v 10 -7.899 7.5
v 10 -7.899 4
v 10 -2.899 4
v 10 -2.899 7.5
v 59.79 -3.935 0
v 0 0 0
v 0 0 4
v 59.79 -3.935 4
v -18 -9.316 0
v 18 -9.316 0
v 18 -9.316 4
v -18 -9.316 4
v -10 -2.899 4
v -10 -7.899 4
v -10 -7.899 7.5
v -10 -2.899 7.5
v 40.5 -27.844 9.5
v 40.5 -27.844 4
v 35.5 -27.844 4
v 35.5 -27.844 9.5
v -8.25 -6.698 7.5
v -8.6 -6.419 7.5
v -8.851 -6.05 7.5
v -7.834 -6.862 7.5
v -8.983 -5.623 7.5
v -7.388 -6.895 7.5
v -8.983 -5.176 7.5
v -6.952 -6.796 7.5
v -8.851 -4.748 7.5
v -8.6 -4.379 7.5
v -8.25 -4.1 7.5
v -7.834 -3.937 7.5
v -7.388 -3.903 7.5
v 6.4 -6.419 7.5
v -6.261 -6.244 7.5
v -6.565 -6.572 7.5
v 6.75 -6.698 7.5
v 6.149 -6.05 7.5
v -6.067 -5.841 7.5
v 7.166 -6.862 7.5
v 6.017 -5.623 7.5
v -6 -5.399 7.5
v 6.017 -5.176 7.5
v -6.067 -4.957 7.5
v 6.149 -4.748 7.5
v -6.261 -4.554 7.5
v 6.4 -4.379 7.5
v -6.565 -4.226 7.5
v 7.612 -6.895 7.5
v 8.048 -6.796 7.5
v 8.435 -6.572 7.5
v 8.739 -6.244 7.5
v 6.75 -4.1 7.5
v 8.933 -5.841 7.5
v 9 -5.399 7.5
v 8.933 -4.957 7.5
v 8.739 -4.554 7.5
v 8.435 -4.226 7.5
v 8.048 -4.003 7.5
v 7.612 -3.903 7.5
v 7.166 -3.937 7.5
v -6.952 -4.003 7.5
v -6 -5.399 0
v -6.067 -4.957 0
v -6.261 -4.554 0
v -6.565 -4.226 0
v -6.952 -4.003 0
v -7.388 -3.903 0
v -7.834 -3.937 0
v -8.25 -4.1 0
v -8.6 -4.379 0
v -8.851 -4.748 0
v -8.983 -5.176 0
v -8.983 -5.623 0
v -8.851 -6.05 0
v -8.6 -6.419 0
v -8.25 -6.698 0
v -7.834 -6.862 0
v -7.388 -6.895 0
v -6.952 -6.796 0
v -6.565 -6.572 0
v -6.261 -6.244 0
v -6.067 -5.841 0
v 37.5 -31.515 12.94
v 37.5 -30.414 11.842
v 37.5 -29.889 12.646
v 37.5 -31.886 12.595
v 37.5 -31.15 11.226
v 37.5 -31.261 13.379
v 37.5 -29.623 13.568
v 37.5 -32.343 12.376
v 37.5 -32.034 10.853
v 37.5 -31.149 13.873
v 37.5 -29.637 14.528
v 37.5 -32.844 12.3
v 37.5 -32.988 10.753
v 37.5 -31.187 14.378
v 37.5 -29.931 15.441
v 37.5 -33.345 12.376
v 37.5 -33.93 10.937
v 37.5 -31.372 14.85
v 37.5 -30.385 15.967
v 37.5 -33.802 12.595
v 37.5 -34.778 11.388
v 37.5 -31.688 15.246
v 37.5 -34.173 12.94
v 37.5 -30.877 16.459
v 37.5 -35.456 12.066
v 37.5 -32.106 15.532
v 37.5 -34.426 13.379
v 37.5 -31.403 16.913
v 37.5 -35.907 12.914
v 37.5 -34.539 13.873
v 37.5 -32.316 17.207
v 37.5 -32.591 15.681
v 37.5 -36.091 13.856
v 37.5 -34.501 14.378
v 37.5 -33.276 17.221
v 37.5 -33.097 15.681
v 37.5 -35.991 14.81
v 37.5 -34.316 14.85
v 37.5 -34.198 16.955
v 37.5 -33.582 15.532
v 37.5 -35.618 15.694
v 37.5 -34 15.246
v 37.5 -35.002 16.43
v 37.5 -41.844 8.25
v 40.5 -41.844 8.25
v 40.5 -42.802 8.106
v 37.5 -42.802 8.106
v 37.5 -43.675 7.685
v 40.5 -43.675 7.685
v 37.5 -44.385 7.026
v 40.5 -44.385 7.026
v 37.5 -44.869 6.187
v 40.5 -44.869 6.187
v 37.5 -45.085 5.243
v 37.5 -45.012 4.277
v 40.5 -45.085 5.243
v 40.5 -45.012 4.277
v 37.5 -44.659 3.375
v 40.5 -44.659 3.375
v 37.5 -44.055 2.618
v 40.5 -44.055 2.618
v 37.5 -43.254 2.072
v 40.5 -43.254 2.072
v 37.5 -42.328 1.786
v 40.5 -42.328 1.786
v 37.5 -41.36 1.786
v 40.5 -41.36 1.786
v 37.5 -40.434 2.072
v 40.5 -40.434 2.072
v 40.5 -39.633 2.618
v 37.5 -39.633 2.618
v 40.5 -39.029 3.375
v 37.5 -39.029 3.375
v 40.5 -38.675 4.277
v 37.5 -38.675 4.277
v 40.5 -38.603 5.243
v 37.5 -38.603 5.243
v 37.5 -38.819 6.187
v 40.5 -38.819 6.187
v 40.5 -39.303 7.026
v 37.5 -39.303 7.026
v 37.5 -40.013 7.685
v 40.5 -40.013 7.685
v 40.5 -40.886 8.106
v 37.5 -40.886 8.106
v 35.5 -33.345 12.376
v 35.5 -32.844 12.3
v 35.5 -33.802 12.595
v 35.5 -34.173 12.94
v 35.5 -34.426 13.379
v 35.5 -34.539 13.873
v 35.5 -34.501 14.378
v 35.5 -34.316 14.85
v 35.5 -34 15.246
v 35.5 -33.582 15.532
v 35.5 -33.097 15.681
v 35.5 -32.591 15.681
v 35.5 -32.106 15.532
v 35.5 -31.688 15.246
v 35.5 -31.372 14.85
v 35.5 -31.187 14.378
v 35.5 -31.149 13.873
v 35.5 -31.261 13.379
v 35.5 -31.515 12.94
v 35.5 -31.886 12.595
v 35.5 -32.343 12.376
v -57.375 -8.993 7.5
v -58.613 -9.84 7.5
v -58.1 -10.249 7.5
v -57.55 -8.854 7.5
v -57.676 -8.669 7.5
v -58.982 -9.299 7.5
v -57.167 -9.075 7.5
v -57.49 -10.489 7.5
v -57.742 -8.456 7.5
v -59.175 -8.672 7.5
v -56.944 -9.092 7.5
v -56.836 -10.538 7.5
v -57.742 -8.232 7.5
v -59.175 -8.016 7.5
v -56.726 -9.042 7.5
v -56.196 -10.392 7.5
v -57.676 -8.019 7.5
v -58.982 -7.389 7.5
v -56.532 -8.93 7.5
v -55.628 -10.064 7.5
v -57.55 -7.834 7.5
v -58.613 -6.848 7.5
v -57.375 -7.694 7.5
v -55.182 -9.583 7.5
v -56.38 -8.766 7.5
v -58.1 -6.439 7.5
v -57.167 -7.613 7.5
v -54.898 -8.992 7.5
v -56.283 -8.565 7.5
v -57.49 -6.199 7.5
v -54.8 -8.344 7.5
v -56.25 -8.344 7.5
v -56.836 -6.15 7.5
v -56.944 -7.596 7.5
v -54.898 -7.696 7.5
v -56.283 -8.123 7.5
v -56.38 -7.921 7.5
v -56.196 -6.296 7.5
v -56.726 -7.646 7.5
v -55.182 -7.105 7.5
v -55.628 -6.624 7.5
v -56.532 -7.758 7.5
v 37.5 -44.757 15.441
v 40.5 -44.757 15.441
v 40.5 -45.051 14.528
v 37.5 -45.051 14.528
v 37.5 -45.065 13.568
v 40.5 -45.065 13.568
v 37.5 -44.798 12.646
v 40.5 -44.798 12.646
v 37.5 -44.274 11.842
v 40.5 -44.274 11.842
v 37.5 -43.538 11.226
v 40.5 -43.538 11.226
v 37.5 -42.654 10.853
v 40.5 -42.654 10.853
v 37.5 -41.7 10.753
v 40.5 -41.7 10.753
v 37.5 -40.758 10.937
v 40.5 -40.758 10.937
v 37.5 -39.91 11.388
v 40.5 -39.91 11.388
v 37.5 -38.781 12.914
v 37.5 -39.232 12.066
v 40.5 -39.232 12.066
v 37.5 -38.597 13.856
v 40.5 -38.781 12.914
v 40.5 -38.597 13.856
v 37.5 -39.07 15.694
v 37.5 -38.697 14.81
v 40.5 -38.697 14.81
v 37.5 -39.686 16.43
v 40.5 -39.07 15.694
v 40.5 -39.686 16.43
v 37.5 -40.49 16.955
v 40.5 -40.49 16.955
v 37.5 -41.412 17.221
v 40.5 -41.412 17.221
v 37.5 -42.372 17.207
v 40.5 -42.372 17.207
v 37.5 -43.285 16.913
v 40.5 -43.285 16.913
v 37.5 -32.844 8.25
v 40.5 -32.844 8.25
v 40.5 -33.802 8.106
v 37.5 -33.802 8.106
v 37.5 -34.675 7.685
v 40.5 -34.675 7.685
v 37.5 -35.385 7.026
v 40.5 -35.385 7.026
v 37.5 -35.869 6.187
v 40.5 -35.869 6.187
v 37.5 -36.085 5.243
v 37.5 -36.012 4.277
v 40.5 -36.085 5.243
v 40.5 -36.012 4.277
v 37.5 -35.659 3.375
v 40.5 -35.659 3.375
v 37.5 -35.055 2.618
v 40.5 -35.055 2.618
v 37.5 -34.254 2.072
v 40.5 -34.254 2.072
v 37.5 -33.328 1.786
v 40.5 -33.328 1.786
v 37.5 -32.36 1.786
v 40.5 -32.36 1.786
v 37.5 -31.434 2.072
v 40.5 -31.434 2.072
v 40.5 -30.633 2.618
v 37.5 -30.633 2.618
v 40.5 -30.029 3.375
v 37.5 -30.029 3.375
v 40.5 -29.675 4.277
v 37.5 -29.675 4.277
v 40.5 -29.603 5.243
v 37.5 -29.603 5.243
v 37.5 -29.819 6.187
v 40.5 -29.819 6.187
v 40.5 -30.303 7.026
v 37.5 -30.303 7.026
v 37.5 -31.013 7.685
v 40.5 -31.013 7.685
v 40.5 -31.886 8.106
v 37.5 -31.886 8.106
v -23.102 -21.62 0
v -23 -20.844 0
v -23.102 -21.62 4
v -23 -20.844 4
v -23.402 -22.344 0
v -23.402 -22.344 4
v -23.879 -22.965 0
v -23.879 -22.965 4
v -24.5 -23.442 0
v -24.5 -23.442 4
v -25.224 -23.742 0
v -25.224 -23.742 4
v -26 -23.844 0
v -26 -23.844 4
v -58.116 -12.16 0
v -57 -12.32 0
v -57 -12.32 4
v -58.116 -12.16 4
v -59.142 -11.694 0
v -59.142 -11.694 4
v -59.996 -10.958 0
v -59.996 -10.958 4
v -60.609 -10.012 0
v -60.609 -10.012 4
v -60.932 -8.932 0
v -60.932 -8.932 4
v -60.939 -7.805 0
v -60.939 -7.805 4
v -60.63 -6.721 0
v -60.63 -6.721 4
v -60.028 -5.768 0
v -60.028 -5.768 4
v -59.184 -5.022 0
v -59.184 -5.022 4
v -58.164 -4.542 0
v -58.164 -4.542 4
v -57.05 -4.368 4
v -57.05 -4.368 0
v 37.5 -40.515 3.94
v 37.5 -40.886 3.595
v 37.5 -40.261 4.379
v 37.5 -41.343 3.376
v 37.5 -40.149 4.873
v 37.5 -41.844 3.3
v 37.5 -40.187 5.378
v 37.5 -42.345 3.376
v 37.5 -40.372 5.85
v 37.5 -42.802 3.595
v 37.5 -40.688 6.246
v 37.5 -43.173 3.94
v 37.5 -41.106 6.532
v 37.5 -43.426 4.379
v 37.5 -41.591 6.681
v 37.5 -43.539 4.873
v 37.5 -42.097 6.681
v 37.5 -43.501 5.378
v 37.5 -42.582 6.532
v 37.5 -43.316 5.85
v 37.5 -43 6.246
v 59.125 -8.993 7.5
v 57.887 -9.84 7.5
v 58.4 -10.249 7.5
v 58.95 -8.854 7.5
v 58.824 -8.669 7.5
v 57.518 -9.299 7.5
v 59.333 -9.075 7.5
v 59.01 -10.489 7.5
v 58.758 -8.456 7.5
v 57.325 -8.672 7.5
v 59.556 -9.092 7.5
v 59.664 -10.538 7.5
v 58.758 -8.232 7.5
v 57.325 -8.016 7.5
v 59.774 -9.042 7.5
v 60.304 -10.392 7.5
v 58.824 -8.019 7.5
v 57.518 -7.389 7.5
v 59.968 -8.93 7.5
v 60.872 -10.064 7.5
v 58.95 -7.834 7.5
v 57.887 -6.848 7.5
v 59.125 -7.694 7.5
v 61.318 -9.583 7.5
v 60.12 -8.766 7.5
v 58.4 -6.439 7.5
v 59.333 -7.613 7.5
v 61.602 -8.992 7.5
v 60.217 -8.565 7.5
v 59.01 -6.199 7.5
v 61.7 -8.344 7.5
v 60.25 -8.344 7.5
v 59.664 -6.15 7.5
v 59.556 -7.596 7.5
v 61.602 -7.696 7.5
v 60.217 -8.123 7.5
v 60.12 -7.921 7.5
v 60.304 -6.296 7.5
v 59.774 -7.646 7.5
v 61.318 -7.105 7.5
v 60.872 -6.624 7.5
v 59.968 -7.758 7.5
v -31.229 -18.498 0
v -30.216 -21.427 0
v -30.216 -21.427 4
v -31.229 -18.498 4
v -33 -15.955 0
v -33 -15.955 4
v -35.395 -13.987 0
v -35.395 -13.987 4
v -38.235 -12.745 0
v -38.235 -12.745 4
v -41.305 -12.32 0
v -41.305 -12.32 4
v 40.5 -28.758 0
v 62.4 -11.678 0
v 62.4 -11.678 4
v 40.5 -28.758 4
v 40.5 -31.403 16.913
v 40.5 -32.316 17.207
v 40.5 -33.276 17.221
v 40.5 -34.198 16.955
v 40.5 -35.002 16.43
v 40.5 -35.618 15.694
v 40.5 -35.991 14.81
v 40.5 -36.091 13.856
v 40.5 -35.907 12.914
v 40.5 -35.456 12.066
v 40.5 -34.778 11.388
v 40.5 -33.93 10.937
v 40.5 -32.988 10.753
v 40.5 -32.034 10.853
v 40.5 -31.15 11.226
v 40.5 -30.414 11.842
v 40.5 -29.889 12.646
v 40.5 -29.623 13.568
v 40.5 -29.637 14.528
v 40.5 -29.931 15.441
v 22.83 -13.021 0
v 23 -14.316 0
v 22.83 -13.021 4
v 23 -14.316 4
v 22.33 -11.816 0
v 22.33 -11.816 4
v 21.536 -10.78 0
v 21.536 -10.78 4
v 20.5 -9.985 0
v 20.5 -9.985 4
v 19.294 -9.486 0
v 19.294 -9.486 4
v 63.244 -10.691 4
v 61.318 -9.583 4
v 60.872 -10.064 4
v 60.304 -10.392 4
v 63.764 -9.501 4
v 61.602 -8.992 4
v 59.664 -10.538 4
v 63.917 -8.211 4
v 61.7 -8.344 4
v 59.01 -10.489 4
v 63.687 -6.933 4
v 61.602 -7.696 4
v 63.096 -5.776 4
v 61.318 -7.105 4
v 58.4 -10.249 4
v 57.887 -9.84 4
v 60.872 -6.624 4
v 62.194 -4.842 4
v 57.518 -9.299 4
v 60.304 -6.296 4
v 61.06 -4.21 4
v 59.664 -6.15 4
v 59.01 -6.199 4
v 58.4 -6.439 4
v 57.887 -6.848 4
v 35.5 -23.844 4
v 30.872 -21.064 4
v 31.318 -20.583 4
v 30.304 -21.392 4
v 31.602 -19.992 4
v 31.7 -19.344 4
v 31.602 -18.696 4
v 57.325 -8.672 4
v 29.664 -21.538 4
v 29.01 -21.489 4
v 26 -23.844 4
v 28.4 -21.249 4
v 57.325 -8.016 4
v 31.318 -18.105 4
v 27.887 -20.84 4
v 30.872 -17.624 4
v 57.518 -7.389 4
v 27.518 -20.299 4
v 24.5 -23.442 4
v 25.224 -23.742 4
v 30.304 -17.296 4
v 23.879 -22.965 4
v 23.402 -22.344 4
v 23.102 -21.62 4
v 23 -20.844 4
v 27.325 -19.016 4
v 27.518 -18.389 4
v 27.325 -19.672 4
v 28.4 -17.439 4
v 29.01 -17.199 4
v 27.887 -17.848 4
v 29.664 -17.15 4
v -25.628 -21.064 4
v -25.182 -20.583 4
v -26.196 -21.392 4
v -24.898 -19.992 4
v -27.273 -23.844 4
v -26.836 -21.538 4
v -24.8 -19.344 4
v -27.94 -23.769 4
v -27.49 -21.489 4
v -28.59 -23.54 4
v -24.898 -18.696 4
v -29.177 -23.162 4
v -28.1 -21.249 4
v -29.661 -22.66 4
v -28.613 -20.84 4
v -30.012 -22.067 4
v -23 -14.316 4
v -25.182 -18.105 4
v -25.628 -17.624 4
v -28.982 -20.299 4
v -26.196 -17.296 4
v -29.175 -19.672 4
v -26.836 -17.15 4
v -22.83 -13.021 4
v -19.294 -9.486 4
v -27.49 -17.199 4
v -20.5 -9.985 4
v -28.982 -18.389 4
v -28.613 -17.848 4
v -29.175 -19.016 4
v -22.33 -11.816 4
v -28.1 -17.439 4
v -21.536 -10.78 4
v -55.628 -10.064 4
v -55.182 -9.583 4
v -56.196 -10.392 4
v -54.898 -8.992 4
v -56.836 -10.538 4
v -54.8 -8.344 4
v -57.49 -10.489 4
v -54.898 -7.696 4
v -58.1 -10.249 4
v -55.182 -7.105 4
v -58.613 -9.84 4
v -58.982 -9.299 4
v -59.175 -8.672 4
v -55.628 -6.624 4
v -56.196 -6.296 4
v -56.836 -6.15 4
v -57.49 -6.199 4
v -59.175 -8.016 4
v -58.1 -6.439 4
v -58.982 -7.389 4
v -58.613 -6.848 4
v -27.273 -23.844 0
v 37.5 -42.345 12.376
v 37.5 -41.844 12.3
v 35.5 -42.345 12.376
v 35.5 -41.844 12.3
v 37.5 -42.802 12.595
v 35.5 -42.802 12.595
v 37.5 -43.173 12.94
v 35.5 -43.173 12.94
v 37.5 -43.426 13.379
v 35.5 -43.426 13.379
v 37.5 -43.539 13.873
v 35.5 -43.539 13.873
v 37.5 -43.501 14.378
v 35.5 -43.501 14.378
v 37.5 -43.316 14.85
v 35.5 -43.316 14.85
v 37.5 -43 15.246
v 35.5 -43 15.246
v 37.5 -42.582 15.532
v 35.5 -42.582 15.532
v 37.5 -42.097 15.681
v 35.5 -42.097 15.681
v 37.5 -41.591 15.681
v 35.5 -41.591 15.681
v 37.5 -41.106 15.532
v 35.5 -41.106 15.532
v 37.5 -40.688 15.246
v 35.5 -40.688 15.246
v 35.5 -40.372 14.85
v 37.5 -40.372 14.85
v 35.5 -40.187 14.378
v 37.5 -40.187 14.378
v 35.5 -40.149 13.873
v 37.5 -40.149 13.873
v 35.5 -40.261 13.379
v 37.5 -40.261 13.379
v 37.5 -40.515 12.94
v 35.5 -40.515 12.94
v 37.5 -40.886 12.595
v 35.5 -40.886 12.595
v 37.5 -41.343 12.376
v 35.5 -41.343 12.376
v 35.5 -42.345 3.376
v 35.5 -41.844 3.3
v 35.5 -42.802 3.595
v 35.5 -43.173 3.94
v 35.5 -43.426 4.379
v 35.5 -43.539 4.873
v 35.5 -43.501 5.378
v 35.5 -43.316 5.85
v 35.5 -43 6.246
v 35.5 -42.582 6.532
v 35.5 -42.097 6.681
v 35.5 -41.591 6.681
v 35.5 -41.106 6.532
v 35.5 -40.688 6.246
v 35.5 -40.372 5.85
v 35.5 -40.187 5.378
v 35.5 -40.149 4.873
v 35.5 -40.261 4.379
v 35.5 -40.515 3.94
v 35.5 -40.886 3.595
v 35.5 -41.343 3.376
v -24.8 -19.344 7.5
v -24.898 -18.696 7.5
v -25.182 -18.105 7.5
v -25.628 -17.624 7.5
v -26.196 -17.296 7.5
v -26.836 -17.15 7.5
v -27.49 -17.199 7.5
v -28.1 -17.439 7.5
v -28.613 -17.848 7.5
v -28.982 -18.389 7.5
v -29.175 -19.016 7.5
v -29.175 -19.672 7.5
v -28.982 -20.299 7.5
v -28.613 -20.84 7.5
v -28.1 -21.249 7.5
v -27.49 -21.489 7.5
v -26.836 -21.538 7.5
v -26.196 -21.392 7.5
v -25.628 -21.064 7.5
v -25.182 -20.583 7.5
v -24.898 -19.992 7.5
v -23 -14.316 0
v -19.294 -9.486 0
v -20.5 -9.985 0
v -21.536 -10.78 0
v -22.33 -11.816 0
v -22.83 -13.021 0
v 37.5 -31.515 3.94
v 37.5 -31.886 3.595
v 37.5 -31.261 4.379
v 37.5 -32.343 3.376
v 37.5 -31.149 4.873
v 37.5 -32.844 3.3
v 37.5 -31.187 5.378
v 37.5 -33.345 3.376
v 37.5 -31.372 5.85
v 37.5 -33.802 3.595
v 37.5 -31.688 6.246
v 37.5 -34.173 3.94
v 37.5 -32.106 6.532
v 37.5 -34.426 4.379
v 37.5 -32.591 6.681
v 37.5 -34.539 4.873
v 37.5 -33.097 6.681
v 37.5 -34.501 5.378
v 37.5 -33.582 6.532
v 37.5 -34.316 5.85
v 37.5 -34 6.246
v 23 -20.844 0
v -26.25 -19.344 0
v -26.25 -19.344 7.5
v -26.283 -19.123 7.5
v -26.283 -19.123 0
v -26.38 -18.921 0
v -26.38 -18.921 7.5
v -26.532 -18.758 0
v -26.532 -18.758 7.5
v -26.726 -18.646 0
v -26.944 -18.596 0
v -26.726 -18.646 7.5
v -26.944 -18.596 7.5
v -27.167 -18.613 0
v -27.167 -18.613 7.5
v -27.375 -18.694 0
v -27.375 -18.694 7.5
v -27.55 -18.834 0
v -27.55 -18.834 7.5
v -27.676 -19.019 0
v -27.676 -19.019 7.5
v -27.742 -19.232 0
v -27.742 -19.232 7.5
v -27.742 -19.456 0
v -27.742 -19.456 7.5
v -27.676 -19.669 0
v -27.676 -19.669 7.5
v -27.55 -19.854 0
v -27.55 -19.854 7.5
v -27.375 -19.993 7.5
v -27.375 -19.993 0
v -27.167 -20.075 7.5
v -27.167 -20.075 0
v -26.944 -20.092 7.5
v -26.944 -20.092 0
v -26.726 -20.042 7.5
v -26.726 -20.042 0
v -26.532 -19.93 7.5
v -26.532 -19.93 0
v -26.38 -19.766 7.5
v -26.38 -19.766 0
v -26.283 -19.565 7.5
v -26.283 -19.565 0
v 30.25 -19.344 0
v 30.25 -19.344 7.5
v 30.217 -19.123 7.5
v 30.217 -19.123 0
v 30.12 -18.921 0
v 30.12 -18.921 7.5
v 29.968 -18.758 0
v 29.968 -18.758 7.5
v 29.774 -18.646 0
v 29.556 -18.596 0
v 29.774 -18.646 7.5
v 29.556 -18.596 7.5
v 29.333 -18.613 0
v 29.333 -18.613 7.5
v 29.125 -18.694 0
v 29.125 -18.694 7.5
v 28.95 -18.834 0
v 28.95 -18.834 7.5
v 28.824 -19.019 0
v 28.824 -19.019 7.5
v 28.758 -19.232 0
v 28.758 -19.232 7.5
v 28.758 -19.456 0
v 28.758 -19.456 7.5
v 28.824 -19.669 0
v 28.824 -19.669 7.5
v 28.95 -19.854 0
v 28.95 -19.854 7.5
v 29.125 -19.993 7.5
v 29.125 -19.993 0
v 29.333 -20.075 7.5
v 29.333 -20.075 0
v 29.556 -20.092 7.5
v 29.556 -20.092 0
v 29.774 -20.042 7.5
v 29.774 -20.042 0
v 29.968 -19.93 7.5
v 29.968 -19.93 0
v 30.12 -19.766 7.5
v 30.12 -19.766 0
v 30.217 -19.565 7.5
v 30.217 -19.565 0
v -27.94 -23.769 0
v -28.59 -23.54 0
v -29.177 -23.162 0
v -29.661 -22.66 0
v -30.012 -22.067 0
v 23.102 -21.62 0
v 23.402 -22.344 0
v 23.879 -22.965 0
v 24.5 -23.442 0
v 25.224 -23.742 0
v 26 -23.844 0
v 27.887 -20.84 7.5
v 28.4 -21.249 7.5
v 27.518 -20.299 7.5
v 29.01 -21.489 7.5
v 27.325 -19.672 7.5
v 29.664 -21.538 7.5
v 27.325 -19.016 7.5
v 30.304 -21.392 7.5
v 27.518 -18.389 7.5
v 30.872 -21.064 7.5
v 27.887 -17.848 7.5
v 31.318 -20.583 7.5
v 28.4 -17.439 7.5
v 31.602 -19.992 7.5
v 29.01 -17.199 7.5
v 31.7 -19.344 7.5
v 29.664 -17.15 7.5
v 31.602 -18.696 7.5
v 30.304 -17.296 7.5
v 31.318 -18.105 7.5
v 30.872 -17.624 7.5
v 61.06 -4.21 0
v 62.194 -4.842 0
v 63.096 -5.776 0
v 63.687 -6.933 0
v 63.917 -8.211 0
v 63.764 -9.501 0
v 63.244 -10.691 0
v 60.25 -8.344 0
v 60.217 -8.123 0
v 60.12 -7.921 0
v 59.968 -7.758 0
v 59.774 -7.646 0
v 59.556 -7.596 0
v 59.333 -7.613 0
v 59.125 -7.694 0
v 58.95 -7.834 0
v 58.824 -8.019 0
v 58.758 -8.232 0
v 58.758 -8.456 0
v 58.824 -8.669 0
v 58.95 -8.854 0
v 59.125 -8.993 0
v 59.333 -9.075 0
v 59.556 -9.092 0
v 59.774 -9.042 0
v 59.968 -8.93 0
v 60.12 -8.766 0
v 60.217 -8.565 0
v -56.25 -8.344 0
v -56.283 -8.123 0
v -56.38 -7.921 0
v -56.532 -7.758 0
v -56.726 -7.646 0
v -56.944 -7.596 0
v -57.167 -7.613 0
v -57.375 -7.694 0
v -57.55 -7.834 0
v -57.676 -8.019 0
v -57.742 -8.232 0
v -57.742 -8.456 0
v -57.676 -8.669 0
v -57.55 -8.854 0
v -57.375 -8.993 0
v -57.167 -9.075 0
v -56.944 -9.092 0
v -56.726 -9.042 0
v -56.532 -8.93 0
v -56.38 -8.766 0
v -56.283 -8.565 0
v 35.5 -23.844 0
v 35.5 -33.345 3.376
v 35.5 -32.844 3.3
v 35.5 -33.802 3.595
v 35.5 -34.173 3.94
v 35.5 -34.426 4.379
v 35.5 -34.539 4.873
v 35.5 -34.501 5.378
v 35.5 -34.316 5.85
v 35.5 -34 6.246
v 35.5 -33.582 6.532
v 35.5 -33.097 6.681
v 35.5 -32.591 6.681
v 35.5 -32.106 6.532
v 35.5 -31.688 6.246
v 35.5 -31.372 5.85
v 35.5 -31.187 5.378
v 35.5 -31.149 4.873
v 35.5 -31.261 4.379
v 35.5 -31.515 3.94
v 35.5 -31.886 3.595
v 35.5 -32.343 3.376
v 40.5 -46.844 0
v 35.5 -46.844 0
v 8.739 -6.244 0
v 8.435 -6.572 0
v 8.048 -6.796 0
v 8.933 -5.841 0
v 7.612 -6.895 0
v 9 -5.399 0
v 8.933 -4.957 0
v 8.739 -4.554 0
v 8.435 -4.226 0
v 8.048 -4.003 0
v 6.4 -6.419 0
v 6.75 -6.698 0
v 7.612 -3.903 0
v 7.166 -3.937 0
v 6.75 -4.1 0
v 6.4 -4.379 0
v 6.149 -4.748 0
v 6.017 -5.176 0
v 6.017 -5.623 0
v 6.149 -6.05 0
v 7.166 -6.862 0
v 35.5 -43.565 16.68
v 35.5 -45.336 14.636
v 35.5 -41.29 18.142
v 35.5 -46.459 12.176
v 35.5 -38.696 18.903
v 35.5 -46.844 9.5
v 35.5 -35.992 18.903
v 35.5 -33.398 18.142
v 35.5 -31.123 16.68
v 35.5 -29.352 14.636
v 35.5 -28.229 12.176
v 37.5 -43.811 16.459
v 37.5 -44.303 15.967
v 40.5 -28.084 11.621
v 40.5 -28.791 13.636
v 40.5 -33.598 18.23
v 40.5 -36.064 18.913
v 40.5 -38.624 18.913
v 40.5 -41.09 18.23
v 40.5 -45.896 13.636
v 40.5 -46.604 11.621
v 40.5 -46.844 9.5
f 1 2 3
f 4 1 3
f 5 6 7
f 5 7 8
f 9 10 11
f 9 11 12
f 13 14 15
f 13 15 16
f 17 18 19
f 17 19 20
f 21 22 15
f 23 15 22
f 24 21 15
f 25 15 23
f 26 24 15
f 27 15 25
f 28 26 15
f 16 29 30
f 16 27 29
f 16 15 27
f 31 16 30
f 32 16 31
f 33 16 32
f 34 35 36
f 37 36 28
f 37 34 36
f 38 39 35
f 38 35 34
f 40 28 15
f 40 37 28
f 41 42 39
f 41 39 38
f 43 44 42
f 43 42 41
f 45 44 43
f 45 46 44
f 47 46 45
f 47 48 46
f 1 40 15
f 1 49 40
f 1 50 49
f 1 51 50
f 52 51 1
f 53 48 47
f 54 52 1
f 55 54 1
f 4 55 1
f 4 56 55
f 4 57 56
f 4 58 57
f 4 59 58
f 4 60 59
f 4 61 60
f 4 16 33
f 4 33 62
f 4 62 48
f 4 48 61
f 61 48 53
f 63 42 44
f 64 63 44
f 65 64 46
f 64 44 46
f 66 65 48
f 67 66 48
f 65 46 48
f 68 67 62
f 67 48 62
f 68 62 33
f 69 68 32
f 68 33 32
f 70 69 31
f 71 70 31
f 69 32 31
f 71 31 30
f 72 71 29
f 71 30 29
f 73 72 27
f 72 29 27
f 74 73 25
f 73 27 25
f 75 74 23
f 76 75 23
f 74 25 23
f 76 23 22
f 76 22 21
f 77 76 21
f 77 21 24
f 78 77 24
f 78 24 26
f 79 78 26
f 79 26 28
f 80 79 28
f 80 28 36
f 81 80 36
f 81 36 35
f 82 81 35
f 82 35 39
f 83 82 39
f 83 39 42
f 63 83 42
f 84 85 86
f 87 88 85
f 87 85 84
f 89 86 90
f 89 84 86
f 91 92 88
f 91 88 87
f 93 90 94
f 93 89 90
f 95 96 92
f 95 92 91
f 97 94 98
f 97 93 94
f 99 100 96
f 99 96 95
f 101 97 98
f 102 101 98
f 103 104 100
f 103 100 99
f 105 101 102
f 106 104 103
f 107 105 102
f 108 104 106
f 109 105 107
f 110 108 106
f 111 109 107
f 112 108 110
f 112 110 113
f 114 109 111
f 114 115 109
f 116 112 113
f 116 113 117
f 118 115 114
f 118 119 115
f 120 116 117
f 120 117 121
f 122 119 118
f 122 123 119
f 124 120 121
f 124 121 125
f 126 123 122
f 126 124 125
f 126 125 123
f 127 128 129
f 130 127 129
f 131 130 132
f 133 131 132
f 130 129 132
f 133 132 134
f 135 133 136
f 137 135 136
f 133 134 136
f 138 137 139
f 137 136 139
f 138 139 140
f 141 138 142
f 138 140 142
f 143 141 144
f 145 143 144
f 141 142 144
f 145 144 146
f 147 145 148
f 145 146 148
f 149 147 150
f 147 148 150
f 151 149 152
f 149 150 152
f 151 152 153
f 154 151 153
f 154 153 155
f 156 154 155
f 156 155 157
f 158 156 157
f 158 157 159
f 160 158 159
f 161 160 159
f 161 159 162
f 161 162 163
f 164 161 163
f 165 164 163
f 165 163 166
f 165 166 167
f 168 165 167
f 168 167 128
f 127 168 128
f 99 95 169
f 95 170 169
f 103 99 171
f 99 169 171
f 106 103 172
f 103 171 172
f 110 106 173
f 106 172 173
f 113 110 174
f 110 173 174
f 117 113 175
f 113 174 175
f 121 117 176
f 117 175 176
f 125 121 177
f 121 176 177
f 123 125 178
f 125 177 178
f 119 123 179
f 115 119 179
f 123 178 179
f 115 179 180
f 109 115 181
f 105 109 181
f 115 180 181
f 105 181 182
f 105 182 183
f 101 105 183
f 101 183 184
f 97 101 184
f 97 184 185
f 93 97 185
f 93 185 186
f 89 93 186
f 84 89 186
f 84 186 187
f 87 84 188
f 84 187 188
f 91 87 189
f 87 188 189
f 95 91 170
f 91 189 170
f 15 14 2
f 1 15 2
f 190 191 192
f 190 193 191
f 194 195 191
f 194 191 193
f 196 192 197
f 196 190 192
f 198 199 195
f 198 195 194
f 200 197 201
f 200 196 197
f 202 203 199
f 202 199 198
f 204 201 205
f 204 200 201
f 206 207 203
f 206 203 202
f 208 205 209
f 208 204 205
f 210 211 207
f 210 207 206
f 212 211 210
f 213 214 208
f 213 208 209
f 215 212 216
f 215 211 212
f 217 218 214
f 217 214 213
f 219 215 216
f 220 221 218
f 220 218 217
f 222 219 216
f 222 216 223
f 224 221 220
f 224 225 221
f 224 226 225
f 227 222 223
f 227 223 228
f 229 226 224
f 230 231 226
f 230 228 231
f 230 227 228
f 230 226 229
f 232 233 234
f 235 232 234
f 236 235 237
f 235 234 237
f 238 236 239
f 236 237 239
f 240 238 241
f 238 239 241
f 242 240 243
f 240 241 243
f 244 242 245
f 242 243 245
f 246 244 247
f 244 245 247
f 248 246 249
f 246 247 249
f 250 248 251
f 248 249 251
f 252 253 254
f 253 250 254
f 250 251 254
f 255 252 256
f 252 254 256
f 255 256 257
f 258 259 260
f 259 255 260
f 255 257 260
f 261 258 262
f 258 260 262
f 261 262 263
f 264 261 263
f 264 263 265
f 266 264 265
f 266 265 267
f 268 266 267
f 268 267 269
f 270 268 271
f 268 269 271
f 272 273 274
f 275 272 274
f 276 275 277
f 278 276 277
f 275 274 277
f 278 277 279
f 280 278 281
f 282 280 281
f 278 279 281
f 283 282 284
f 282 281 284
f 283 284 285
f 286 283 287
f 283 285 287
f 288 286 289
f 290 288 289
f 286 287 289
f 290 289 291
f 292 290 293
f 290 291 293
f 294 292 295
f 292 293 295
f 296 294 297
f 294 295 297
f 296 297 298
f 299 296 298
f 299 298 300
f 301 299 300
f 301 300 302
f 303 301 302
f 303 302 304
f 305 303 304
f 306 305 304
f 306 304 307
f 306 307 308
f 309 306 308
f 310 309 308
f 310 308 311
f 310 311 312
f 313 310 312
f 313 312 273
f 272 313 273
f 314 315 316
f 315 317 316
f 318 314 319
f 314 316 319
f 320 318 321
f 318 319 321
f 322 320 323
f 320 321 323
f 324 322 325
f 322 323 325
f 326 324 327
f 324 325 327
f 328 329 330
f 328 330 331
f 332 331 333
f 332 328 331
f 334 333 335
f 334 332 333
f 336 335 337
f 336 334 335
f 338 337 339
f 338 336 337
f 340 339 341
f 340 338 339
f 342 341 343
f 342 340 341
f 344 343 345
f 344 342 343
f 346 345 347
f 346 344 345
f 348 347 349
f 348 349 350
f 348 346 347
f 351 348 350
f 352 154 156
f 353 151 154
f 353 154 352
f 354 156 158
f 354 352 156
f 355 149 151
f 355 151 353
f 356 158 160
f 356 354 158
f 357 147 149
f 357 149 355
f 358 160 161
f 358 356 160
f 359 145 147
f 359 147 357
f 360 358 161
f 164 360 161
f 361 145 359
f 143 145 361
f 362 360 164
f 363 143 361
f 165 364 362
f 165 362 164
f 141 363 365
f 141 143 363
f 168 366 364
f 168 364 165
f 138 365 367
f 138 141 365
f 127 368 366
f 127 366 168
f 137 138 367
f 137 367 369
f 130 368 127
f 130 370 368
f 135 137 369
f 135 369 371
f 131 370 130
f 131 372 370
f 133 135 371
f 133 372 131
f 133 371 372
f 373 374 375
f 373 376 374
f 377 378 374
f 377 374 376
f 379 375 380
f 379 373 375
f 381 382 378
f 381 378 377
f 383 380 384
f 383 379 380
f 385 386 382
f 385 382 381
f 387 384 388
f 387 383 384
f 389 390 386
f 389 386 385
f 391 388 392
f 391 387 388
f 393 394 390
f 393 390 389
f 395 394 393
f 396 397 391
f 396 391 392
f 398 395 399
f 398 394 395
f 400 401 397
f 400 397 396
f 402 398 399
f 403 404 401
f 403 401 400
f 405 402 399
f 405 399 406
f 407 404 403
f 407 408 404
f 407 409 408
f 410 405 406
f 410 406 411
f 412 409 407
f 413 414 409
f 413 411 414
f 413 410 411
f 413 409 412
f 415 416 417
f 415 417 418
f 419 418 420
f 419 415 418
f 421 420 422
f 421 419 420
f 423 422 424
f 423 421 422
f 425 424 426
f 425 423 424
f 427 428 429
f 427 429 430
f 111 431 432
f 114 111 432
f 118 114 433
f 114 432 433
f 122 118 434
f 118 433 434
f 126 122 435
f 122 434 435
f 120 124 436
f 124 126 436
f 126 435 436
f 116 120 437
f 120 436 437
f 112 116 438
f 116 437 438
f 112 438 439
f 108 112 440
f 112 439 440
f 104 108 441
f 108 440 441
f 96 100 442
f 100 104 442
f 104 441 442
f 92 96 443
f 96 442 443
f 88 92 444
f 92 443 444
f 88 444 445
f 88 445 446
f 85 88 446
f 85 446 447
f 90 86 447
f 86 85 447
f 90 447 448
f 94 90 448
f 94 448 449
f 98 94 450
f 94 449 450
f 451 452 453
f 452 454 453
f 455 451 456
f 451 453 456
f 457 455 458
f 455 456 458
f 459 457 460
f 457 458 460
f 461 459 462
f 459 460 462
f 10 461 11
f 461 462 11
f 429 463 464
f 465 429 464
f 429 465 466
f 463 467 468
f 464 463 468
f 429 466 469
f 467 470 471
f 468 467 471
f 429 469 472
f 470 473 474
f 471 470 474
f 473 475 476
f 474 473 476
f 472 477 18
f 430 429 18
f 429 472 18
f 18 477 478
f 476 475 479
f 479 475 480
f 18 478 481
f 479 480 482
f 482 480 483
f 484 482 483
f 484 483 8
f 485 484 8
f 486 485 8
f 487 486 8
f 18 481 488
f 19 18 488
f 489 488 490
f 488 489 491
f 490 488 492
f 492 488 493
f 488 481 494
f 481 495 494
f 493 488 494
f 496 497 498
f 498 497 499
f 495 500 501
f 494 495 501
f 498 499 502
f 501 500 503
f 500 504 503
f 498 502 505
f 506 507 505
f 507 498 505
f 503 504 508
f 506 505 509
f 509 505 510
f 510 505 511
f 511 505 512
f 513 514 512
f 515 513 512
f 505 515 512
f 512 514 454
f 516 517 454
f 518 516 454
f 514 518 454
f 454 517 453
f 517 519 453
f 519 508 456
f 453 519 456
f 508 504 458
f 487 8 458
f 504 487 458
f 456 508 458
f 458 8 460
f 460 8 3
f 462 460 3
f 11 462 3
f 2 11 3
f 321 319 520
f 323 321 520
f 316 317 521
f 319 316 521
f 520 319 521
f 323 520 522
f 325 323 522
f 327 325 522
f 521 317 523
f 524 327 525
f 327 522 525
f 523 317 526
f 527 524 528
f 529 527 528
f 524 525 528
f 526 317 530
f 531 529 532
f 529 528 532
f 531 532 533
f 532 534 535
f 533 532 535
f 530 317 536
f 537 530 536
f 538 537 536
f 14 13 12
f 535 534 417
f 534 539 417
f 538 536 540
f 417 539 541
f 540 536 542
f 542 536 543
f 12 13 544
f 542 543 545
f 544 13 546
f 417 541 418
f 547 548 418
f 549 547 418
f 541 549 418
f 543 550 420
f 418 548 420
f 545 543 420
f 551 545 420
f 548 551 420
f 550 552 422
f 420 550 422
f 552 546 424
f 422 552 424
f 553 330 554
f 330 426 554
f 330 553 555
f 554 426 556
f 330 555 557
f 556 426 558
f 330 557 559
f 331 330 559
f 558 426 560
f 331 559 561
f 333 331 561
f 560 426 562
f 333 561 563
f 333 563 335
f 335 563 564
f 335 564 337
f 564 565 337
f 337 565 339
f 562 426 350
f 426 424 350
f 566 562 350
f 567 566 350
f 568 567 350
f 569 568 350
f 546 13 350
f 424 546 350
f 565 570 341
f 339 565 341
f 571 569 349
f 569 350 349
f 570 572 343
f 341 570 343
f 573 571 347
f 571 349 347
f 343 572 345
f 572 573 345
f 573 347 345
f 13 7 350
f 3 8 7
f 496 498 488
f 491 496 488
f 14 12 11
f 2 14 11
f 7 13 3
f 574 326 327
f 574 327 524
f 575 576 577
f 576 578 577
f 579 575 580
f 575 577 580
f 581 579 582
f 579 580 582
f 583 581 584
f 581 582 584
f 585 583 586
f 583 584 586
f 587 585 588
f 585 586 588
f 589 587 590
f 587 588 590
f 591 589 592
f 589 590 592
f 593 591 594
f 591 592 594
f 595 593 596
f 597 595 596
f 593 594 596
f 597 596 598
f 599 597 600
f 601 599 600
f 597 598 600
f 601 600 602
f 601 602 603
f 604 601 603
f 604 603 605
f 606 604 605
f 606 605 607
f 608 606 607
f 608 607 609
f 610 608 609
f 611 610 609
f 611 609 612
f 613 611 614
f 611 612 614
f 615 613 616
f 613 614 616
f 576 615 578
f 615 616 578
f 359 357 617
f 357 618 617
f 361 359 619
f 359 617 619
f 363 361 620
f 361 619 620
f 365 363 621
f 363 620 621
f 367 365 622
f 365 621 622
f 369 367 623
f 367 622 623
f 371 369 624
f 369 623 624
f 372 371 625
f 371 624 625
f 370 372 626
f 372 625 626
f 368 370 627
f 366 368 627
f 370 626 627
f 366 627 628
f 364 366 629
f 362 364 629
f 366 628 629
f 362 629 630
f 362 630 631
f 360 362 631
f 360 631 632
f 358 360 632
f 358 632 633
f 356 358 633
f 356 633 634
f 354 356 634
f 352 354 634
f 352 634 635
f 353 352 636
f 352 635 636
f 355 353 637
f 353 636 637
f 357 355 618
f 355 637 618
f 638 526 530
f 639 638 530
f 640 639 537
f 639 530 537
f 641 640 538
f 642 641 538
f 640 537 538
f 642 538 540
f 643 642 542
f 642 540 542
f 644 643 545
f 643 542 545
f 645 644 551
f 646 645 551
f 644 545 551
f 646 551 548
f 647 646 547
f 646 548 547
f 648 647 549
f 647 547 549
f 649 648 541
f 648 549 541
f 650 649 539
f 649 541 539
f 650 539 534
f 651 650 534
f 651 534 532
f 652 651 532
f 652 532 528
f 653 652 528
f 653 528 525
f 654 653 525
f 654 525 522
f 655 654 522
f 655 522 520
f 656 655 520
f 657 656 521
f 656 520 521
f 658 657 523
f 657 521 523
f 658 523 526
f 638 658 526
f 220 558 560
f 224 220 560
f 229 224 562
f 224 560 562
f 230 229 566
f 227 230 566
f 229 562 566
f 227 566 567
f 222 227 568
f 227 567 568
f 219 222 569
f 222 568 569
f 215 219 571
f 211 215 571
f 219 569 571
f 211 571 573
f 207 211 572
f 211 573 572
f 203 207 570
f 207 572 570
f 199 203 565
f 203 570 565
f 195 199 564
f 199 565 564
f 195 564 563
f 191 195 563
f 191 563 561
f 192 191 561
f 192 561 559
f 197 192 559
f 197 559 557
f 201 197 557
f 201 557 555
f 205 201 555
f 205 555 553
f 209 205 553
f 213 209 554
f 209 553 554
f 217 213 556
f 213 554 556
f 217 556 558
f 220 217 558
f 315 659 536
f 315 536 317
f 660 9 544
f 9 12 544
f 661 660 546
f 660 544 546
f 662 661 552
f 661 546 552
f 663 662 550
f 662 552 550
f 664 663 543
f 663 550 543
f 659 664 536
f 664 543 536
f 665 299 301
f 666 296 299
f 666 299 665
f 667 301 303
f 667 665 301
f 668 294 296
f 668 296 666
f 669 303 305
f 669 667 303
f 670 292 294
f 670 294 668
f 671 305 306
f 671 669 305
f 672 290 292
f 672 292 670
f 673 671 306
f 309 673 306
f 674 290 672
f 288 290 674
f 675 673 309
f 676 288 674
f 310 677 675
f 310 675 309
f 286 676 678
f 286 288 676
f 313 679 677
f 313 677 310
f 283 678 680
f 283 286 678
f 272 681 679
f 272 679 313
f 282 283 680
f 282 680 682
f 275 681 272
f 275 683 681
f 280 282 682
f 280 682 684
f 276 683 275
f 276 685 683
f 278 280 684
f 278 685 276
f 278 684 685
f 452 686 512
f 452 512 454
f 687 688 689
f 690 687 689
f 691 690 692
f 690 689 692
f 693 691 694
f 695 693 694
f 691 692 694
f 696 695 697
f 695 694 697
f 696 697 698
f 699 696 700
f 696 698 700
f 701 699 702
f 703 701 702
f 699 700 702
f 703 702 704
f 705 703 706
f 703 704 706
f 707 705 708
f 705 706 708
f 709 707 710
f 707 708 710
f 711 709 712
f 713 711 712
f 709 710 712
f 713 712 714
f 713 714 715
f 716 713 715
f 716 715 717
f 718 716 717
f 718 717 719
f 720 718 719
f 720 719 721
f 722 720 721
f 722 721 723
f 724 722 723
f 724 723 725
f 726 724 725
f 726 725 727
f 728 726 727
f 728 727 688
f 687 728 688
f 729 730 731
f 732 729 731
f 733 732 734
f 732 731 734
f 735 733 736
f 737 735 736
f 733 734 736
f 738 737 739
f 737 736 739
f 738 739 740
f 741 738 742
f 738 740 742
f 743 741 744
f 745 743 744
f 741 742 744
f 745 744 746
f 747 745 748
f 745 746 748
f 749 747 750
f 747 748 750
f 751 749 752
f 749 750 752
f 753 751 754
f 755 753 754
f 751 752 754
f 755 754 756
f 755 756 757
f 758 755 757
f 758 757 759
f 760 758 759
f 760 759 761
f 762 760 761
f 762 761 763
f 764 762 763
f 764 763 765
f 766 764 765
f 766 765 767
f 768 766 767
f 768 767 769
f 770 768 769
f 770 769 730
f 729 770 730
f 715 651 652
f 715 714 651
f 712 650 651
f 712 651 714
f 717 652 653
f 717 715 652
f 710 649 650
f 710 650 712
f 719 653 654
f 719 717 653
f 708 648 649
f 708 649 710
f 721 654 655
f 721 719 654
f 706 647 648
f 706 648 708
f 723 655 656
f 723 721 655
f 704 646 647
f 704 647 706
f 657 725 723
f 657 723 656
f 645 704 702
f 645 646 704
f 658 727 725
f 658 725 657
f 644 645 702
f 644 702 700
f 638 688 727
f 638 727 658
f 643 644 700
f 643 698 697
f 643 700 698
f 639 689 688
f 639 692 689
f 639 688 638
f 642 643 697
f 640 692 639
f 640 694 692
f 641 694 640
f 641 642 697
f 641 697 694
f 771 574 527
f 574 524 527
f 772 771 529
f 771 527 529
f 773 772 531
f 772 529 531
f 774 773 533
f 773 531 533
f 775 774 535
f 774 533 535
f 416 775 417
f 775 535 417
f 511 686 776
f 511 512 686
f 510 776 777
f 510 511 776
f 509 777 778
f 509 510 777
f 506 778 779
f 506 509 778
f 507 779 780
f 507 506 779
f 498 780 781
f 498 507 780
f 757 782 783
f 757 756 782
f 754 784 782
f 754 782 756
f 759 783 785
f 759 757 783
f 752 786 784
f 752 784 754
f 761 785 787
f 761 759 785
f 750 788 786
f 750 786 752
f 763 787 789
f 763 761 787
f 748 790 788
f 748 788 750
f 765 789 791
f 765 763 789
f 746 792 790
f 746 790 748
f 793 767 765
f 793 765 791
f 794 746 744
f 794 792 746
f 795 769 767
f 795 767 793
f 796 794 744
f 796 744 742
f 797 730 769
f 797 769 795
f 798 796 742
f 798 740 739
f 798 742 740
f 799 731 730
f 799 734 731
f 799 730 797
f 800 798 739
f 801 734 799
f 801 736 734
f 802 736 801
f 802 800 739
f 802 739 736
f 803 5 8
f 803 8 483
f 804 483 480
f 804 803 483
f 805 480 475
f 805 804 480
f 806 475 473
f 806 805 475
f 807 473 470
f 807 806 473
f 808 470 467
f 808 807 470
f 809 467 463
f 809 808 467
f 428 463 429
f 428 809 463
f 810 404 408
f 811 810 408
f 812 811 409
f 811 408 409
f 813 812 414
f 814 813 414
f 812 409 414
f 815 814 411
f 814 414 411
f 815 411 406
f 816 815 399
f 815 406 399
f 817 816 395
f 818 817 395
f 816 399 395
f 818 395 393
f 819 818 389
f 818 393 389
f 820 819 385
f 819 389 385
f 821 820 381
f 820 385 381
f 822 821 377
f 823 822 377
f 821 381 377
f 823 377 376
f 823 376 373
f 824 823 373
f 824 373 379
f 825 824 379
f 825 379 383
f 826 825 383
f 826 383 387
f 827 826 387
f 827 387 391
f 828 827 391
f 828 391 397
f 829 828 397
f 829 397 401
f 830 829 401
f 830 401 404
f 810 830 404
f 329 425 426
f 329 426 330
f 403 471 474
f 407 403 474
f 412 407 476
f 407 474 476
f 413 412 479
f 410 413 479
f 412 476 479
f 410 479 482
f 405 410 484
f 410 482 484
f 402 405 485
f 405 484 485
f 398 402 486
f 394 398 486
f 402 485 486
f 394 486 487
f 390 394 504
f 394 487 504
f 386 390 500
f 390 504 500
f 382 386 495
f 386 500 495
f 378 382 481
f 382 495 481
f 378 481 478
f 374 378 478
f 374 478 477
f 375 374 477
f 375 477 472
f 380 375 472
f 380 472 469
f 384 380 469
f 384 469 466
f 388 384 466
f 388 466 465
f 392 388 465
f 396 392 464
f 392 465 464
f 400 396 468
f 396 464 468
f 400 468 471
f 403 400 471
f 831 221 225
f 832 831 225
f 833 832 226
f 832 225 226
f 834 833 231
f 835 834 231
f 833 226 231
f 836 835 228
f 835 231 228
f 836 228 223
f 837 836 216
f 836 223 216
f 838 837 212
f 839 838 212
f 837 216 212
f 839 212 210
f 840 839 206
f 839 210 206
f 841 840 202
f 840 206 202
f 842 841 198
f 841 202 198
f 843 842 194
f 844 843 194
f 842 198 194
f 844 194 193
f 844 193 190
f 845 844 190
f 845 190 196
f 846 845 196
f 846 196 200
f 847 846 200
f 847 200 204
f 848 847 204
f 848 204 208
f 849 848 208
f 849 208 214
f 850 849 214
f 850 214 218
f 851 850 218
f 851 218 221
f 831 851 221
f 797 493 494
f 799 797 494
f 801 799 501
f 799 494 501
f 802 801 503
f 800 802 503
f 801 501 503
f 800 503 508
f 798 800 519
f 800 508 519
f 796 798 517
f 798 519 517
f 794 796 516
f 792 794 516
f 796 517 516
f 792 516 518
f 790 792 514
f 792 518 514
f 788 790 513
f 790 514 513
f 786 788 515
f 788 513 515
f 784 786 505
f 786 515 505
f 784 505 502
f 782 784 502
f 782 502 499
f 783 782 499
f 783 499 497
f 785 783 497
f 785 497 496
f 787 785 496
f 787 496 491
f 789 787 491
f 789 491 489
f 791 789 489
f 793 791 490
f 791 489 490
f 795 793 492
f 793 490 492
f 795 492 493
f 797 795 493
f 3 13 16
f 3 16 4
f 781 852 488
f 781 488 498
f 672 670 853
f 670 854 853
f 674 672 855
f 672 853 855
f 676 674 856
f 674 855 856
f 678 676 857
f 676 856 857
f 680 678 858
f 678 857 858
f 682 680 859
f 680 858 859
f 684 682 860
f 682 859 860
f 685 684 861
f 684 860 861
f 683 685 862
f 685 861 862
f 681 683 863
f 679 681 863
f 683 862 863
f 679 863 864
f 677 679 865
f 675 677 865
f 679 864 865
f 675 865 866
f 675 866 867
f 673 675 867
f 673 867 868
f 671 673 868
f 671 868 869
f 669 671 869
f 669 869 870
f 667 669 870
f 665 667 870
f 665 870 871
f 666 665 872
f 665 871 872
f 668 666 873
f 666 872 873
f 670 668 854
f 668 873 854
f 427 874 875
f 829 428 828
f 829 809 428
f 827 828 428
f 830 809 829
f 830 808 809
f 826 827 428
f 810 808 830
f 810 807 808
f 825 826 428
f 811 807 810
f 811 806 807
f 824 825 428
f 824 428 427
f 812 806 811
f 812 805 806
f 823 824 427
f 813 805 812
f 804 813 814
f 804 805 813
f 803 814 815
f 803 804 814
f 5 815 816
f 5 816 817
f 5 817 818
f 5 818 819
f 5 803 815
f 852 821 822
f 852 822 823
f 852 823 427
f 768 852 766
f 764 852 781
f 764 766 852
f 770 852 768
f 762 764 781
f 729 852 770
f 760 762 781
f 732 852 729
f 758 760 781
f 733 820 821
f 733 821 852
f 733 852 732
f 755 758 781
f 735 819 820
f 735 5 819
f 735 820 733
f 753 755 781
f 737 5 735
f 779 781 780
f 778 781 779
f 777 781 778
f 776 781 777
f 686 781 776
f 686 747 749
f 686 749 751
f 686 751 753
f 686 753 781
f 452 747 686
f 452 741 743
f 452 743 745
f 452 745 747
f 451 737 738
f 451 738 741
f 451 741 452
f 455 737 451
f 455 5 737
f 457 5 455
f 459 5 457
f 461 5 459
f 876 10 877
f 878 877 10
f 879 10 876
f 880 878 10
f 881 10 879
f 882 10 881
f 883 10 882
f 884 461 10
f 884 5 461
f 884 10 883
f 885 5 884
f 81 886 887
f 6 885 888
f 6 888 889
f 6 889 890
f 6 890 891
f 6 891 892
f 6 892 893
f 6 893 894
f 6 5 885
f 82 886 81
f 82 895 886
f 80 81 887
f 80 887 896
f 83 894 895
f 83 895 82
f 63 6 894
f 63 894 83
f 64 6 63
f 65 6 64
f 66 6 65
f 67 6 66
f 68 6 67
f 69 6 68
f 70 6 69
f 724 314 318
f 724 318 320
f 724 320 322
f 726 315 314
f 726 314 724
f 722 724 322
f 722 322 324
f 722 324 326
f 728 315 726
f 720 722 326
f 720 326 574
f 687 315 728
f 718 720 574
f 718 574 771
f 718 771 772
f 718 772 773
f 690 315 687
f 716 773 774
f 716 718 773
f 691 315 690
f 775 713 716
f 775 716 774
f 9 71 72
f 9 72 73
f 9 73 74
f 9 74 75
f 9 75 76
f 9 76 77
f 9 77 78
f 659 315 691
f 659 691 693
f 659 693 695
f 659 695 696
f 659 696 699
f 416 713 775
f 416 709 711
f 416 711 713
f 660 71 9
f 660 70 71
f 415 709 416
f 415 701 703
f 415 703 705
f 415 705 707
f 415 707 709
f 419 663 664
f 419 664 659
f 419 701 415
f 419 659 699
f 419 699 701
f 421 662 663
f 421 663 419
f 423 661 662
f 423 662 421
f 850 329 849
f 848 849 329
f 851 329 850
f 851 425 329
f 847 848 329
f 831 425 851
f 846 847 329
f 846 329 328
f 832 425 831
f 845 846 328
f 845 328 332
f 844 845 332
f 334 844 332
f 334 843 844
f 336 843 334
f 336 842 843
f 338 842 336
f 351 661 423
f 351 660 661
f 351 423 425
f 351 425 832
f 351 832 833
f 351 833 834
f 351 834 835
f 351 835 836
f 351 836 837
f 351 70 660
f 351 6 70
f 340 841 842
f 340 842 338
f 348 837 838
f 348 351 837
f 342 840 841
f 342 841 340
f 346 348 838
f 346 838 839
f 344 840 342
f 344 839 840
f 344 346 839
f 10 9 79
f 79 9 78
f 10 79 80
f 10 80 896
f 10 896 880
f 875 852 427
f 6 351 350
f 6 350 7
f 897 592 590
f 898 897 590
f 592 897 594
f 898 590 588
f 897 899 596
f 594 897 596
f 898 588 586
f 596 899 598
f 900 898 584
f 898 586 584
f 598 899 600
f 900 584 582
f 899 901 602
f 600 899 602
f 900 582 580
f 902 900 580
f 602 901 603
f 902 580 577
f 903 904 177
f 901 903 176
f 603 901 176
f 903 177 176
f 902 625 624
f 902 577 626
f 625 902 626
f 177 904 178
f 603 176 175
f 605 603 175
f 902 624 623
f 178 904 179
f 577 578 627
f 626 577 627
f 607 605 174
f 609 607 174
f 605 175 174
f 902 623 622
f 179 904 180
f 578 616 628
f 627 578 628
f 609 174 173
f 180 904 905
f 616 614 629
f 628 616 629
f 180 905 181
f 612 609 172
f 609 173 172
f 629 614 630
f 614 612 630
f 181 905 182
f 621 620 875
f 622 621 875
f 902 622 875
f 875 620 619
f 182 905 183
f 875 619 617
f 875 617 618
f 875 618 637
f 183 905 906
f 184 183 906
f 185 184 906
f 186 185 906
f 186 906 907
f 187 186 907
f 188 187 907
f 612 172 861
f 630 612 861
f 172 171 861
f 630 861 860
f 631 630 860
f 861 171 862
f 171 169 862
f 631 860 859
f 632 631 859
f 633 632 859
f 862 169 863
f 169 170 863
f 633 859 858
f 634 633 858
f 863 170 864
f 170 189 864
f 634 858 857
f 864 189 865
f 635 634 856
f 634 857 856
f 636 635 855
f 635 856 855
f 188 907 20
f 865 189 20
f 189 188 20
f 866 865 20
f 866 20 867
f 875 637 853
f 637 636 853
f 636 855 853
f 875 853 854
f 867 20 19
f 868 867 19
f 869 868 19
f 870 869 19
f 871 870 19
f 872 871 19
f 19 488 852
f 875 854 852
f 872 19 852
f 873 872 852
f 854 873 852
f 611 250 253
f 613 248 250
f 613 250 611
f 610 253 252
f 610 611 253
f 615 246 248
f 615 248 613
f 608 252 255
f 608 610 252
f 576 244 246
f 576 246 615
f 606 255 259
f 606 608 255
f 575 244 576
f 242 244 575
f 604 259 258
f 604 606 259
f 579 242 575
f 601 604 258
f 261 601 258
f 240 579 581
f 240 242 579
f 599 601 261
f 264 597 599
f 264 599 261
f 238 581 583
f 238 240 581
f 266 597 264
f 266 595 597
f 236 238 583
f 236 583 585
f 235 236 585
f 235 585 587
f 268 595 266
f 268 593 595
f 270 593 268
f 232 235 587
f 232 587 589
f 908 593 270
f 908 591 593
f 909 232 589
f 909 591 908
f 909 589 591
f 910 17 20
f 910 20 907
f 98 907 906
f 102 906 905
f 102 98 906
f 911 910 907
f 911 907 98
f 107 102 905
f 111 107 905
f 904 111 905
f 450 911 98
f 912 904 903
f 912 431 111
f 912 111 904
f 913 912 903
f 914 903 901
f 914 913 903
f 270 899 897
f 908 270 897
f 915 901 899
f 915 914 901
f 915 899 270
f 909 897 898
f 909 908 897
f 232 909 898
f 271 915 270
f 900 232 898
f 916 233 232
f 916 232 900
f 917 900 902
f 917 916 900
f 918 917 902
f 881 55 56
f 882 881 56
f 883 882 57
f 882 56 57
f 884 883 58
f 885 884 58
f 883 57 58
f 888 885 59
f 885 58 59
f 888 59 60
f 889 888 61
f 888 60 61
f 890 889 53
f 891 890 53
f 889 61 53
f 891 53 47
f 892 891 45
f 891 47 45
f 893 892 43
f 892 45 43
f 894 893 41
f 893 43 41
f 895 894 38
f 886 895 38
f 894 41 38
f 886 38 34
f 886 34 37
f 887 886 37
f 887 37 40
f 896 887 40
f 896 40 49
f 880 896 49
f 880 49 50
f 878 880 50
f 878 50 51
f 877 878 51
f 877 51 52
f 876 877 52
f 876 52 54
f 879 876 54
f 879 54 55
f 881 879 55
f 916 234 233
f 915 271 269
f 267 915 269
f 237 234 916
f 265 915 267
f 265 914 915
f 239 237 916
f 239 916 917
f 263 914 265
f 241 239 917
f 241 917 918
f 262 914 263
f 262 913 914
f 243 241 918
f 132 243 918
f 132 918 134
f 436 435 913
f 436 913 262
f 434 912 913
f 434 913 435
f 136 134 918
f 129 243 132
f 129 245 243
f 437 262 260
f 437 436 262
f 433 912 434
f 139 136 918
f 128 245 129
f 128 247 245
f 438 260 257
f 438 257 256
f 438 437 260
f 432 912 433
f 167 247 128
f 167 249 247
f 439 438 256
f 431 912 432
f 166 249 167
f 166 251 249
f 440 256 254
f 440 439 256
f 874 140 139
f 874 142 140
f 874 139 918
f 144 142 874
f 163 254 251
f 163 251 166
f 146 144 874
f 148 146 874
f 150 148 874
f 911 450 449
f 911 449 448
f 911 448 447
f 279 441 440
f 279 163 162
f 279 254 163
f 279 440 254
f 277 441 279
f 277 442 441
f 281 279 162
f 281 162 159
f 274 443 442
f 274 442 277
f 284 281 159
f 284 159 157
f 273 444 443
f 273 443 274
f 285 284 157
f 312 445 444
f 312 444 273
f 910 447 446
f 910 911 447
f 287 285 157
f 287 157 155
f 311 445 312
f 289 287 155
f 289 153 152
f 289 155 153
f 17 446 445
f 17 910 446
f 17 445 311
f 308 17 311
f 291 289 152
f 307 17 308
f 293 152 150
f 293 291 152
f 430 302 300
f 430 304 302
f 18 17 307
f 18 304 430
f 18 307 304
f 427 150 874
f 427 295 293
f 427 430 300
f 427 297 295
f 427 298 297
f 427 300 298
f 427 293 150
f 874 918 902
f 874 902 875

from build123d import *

# Parameters (mm, degrees)
BOSS_EXTRUDE1_DEPTH            = 4
SKETCH2_R                      = 2.2
BOSS_EXTRUDE2_DEPTH            = 3.5
SKETCH3_R                      = 0.75
CUT_EXTRUDE1_DEPTH             = 8.5
SKETCH4_R                      = 2.2
BOSS_EXTRUDE3_DEPTH            = 3.5
SKETCH5_R                      = 0.75
CUT_EXTRUDE2_DEPTH             = 8.5
SKETCH6_R                      = 2.2
BOSS_EXTRUDE4_DEPTH            = 3.5
SKETCH7_R                      = 0.75
CUT_EXTRUDE3_DEPTH             = 8.5
SKETCH8_R                      = 2.2
BOSS_EXTRUDE5_DEPTH            = 3.5
SKETCH9_R                      = 0.75
CUT_EXTRUDE4_DEPTH             = 8.5
SKETCH10_W                     = 20
SKETCH10_H                     = 5
BOSS_EXTRUDE6_DEPTH            = 3.5
SKETCH11_R                     = 1.5
CUT_EXTRUDE5_DEPTH             = 8.5
BOSS_EXTRUDE8_DEPTH            = 5
CBORE_FOR_M3_SHCS1_D           = 3.4
CBORE_FOR_M3_SHCS1_CBORE_D     = 6.5
CBORE_FOR_M3_SHCS1_CBORE_DEPTH = 3
FILLET1_R                      = 5
FILLET2_R                      = 3


with BuildPart() as part:
    # Sketch1 → Boss-Extrude1 (new body)
    with BuildSketch(Plane.XY):
        with BuildLine():
            Line((0, 0), (59.790168207, -3.934842784))
            ThreePointArc((59.790168207, -3.934842784), (63.68729409, -6.932891166), (62.399590235, -11.678173352))
            Line((62.399590235, -11.678173352), (40.5, -28.758482209))
            Line((40.5, -28.758482209), (40.5, -46.843965811))
            Line((40.5, -46.843965811), (35.5, -46.843965811))
            Line((35.5, -46.843965811), (35.5, -23.843965811))
            Line((35.5, -23.843965811), (23, -23.843965811))
            Line((23, -23.843965811), (23, -9.315581275))
            Line((23, -9.315581275), (-23, -9.315581275))
            Line((-23, -9.315581275), (-23, -23.843965815))
            Line((-23, -23.843965815), (-30, -23.843965815))
            Line((-30, -23.843965815), (-30, -23.624609813))
            ThreePointArc((-30, -23.624609813), (-33.311090065, -15.630931272), (-41.304768605, -12.319841207))
            Line((-41.304768605, -12.319841207), (-57, -12.319841207))
            ThreePointArc((-57, -12.319841207), (-60.975796988, -8.36893525), (-57.049937893, -4.368404043))
            Line((-57.049937893, -4.368404043), (0, 0))
        make_face()
    extrude(amount=BOSS_EXTRUDE1_DEPTH)

    # Sketch2 → Boss-Extrude2 (add)
    with BuildSketch(Plane.XY.offset(4)):
        with Locations((59.5, -8.343965811)):
            Circle(SKETCH2_R)
    extrude(amount=BOSS_EXTRUDE2_DEPTH)

    # Sketch3 → Cut-Extrude1 (cut, through all)
    with BuildSketch(Plane.XY.offset(7.5)):
        with Locations((59.5, -8.343965811)):
            Circle(SKETCH3_R)
    extrude(amount=-CUT_EXTRUDE1_DEPTH, mode=Mode.SUBTRACT)

    # Sketch4 → Boss-Extrude3 (add)
    with BuildSketch(Plane.XY.offset(4)):
        with Locations((29.5, -19.343965811)):
            Circle(SKETCH4_R)
    extrude(amount=BOSS_EXTRUDE3_DEPTH)

    # Sketch5 → Cut-Extrude2 (cut, through all)
    with BuildSketch(Plane.XY.offset(7.5)):
        with Locations((29.5, -19.343965811)):
            Circle(SKETCH5_R)
    extrude(amount=-CUT_EXTRUDE2_DEPTH, mode=Mode.SUBTRACT)

    # Sketch6 → Boss-Extrude4 (add)
    with BuildSketch(Plane.XY.offset(4)):
        with Locations((-57, -8.343965811)):
            Circle(SKETCH6_R)
    extrude(amount=BOSS_EXTRUDE4_DEPTH)

    # Sketch7 → Cut-Extrude3 (cut, through all)
    with BuildSketch(Plane.XY.offset(7.5)):
        with Locations((-57, -8.343965811)):
            Circle(SKETCH7_R)
    extrude(amount=-CUT_EXTRUDE3_DEPTH, mode=Mode.SUBTRACT)

    # Sketch8 → Boss-Extrude5 (add)
    with BuildSketch(Plane.XY.offset(4)):
        with Locations((-27, -19.343965811)):
            Circle(SKETCH8_R)
    extrude(amount=BOSS_EXTRUDE5_DEPTH)

    # Sketch9 → Cut-Extrude4 (cut, through all)
    with BuildSketch(Plane.XY.offset(7.5)):
        with Locations((-27, -19.343965811)):
            Circle(SKETCH9_R)
    extrude(amount=-CUT_EXTRUDE4_DEPTH, mode=Mode.SUBTRACT)

    # Sketch10 → Boss-Extrude6 (add)
    with BuildSketch(Plane.XY.offset(4)):
        with Locations((0, -5.399210768)):
            Rectangle(SKETCH10_W, SKETCH10_H)
    extrude(amount=BOSS_EXTRUDE6_DEPTH)

    # Sketch11 → Cut-Extrude5 (cut, through all)
    with BuildSketch(Plane.XY.offset(7.5)):
        with Locations((-7.5, -5.399210768)):
            Circle(SKETCH11_R)
        with Locations((7.5, -5.399210768)):
            Circle(SKETCH11_R)
    extrude(amount=-CUT_EXTRUDE5_DEPTH, mode=Mode.SUBTRACT)

    # Sketch12 → Boss-Extrude8 (add)
    with BuildSketch(Plane(origin=(40.5, 0, 0), x_dir=(0, 0, -1), z_dir=(1, 0, 0))):
        with BuildLine():
            ThreePointArc((-4, -29.597999119), (-6.613538808, -28.293090617), (-9.5, -27.843965811))
            Line((-9.5, -27.843965811), (-9.5, -46.843965811))
            ThreePointArc((-9.5, -46.843965811), (-6.613538808, -46.394841006), (-4, -45.089932504))
            Line((-4, -45.089932504), (-4, -29.597999119))
        make_face()
        with BuildLine():
            Line((-4, -27.843965811), (-9.5, -27.843965811))
            ThreePointArc((-9.5, -27.843965811), (-6.613538808, -28.293090617), (-4, -29.597999119))
            Line((-4, -29.597999119), (-4, -27.843965811))
        make_face()
        with BuildLine():
            Line((-9.5, -46.843965811), (-9.5, -27.843965811))
            ThreePointArc((-9.5, -27.843965811), (-19, -37.343965811), (-9.5, -46.843965811))
        make_face()
        with BuildLine():
            ThreePointArc((-4, -45.089932504), (-6.613538808, -46.394841006), (-9.5, -46.843965811))
            Line((-9.5, -46.843965811), (-4, -46.843965811))
            Line((-4, -46.843965811), (-4, -45.089932504))
        make_face()
        with BuildLine():
            ThreePointArc((0, -37.343965811), (-1.059028492, -32.985066868), (-4, -29.597999119))
            Line((-4, -29.597999119), (-4, -45.089932504))
            ThreePointArc((-4, -45.089932504), (-1.059028492, -41.702864755), (0, -37.343965811))
        make_face()
    extrude(amount=-BOSS_EXTRUDE8_DEPTH)

    # CBORE for M3 SHCS1 (through all)
    with Locations(Plane(origin=(40.5, -32.843965811, 14), x_dir=(0, 0, 1), z_dir=(1, 0, 0))):
        with Locations((0, 0), (-9, 0), (0, 9), (-9, 9)):
            CounterBoreHole(CBORE_FOR_M3_SHCS1_D / 2, CBORE_FOR_M3_SHCS1_CBORE_D / 2, CBORE_FOR_M3_SHCS1_CBORE_DEPTH)

    # Fillet1
    fillet1_edges = [part.edges().sort_by_distance(p)[0] for p in [
        (23, -9.315581275, 2),
        (-23, -9.315581275, 2),
    ]]
    fillet(fillet1_edges, radius=FILLET1_R)

    # Fillet2
    fillet2_edges = [part.edges().sort_by_distance(p)[0] for p in [
        (-30, -23.843965815, 2),
        (23, -23.843965811, 2),
        (-23, -23.843965815, 2),
    ]]
    fillet(fillet2_edges, radius=FILLET2_R)


solid = part.part
